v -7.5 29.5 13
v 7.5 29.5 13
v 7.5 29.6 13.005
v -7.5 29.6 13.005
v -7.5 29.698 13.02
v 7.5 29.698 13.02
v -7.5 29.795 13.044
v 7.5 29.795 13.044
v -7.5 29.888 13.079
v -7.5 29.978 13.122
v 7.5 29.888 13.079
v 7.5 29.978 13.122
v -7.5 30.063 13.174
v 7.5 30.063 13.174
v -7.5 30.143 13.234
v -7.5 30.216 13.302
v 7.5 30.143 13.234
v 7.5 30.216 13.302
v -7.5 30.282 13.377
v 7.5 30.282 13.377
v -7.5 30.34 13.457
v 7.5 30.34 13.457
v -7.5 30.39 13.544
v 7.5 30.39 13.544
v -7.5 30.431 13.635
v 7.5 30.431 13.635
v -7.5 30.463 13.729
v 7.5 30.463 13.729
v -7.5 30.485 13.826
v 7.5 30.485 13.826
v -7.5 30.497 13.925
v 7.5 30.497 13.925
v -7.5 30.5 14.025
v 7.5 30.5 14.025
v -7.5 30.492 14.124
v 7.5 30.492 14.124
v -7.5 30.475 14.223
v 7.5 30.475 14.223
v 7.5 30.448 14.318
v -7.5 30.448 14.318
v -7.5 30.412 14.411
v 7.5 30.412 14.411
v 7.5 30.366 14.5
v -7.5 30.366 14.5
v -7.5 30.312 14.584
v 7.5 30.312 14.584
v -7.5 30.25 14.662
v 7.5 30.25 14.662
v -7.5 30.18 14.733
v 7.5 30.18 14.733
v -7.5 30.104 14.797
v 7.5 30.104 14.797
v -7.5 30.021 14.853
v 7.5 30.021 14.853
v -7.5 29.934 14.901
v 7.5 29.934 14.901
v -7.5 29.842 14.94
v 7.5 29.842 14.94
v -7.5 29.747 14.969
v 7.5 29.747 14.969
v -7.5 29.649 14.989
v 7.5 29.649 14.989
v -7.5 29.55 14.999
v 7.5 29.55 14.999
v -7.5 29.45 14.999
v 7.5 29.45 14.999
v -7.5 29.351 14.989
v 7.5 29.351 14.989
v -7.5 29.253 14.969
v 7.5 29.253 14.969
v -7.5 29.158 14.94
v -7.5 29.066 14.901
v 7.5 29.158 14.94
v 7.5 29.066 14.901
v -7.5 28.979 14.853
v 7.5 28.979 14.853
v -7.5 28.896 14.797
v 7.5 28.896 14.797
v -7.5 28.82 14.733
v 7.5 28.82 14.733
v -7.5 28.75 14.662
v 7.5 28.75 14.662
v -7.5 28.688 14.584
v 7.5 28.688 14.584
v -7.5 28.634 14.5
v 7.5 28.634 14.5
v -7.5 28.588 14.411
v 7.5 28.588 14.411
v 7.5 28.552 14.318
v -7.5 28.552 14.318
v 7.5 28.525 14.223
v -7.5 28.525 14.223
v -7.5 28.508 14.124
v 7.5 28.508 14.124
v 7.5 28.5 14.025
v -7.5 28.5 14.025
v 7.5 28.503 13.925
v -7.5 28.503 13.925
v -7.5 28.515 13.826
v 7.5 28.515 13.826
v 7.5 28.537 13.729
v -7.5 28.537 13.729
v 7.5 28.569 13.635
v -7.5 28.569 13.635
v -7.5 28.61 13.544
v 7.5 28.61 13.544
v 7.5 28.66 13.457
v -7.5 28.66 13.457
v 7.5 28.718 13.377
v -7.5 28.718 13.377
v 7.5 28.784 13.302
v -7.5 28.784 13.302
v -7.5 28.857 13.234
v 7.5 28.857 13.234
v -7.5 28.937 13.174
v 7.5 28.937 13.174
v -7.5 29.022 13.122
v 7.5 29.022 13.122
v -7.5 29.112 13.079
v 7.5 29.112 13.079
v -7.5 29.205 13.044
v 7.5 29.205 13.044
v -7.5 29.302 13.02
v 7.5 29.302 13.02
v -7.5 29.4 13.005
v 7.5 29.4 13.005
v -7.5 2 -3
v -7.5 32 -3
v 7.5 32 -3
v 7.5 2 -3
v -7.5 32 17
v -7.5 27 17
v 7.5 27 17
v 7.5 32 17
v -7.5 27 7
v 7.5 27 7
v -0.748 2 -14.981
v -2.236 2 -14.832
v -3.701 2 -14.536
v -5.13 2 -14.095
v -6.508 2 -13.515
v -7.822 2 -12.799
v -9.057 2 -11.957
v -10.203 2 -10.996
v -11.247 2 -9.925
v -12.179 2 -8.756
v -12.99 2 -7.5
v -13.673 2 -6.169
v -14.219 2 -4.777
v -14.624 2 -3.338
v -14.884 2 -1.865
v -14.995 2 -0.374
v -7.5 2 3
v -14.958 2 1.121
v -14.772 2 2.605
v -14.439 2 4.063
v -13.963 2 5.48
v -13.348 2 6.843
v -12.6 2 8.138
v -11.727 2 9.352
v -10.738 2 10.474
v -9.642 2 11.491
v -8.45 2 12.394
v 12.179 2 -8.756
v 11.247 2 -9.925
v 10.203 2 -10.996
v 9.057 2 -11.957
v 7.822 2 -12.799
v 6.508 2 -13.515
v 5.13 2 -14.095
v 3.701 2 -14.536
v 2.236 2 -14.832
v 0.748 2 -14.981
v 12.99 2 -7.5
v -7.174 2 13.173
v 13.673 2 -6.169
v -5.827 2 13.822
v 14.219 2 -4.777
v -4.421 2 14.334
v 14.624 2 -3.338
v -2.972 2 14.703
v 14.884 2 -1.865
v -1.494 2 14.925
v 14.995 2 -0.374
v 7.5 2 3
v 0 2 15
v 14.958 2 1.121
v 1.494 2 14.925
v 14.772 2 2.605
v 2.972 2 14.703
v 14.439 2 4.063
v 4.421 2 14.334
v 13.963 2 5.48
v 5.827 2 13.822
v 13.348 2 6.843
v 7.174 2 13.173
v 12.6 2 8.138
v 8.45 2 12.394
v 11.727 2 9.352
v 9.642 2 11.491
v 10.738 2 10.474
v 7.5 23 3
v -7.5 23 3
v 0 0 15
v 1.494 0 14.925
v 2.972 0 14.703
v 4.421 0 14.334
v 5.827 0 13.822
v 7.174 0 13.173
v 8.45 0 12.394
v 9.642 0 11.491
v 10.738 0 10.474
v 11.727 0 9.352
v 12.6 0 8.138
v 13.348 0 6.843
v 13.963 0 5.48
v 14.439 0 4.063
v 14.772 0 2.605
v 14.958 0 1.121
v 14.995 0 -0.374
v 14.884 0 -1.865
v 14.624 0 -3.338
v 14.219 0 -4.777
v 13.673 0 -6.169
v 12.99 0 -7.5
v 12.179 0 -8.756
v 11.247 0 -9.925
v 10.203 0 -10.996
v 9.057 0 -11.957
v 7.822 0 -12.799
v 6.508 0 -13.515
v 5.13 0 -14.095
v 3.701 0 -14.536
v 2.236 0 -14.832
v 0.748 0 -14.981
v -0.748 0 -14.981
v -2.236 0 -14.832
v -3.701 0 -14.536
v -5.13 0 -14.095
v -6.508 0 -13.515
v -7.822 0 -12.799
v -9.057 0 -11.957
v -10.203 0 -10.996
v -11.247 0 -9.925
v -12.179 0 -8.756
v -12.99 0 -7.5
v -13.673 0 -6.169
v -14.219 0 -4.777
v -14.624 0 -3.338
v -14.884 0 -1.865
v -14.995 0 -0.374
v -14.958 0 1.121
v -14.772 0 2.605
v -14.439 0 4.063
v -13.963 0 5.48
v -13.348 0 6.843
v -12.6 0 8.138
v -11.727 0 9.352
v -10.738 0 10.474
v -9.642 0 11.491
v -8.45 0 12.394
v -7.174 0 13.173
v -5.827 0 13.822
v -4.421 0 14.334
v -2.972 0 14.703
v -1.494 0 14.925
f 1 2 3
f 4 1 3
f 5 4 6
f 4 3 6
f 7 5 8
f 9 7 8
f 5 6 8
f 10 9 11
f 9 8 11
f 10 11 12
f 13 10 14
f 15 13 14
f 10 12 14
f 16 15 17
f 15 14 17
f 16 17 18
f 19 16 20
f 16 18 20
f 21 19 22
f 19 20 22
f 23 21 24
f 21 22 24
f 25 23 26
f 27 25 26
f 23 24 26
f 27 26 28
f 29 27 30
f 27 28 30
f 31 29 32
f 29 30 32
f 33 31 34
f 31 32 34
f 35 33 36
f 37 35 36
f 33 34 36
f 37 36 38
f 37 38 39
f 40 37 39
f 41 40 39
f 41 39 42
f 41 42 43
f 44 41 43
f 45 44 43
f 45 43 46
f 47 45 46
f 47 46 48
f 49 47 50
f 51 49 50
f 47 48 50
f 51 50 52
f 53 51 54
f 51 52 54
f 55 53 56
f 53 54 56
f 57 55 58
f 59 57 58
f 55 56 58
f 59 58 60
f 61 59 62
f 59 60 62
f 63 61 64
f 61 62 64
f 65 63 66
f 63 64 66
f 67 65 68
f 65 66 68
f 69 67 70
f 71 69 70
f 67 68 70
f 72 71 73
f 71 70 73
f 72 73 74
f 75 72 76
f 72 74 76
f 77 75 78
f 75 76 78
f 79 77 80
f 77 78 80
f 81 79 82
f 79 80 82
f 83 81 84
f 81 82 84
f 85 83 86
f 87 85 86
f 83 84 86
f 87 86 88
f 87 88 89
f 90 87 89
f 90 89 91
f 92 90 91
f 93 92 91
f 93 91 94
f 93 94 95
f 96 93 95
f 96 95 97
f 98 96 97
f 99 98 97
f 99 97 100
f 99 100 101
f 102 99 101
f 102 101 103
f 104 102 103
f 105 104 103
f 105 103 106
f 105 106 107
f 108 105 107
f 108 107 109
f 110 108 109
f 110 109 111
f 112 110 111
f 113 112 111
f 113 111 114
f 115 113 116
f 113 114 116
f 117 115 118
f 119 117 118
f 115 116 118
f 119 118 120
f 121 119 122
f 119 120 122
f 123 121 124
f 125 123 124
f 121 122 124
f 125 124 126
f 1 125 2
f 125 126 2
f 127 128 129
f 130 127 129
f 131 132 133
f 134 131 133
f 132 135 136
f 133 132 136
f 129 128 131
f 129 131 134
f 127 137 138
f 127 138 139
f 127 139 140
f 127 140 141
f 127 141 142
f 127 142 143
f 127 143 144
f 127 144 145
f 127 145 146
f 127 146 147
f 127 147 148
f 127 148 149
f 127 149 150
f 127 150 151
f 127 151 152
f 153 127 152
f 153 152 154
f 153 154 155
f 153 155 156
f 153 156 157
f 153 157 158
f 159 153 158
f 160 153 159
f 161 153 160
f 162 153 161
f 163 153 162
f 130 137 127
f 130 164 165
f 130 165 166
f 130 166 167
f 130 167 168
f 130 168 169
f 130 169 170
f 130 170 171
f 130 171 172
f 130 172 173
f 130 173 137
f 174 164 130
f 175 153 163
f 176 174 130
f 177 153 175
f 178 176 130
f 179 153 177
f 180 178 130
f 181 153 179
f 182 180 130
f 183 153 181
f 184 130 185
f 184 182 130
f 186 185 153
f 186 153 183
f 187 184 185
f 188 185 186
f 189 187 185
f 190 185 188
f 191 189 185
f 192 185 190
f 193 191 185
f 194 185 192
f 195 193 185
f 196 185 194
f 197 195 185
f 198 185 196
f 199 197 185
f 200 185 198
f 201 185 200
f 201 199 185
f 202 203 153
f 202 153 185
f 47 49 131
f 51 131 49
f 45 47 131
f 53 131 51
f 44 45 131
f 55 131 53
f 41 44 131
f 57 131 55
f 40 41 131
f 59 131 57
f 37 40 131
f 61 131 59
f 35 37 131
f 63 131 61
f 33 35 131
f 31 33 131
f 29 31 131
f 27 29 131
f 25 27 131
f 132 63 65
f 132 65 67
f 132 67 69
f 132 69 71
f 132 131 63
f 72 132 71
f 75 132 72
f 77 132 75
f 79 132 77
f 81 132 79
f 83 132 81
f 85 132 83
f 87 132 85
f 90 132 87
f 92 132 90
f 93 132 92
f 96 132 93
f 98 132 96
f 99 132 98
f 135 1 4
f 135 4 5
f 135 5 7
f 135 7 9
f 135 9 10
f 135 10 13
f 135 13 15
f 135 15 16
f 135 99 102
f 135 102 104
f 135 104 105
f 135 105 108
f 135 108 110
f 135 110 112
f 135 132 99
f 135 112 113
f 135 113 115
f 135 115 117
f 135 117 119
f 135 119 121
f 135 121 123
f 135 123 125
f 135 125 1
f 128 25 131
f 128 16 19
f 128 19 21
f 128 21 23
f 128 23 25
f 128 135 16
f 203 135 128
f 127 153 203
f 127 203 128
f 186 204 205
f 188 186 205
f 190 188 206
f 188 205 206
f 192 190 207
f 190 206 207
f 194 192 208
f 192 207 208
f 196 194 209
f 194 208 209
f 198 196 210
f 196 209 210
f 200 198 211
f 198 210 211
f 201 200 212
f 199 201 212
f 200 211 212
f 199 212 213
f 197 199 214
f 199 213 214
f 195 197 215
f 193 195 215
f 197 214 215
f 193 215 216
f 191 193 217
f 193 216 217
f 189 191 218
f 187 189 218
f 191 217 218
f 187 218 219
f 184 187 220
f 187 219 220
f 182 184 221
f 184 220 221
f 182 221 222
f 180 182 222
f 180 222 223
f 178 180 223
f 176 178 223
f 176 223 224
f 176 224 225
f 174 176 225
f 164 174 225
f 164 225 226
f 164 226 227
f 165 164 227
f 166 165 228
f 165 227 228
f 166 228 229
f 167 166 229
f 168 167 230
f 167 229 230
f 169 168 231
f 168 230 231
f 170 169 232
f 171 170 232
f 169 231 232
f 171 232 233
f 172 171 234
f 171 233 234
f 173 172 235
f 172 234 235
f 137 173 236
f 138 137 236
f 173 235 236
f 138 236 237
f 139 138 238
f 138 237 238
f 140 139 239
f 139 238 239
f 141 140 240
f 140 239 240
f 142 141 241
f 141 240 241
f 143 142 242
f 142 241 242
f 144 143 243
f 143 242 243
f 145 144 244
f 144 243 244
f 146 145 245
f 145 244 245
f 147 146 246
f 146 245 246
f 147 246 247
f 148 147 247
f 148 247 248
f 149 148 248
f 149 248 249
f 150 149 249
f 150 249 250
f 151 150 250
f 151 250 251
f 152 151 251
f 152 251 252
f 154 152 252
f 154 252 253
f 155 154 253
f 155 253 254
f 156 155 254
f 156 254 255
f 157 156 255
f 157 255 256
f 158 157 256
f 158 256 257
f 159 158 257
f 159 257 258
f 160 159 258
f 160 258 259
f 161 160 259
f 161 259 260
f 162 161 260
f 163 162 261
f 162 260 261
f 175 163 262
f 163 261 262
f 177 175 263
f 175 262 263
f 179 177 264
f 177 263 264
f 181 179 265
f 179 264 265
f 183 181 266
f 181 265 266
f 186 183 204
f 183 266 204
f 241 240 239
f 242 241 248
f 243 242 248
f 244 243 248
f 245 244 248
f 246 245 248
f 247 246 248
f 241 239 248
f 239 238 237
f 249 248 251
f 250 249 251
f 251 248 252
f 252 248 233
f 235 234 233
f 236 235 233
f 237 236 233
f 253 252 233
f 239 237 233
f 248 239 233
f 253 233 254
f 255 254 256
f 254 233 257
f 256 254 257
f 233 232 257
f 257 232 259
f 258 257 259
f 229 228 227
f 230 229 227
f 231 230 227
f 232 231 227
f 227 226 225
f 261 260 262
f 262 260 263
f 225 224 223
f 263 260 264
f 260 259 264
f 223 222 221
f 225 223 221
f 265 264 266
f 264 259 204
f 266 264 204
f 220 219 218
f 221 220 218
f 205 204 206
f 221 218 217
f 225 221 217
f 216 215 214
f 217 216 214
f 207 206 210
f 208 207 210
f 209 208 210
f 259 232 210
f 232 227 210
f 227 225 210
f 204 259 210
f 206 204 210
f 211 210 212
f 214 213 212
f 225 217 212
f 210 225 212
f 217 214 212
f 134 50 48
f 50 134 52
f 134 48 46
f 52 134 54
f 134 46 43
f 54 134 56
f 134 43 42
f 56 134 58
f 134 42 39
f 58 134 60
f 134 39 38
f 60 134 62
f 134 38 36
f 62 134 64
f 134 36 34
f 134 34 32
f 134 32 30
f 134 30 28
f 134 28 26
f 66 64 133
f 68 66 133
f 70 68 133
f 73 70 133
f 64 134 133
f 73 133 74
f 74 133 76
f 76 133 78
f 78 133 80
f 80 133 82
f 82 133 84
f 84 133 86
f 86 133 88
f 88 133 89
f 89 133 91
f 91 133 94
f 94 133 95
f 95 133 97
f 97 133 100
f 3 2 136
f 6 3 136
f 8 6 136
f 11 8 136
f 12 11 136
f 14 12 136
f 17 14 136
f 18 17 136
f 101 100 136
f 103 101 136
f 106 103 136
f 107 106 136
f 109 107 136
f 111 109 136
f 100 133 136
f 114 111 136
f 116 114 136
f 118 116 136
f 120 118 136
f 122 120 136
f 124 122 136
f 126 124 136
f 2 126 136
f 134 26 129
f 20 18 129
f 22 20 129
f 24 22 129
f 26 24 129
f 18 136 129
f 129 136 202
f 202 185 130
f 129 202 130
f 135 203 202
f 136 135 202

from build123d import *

# Parameters (mm, degrees)
SKETCH1_R           = 15
BOSS_EXTRUDE1_DEPTH = 2
SKETCH2_W           = 15
SKETCH2_H           = 6
BOSS_EXTRUDE2_DEPTH = 25
SKETCH3_W           = 15
SKETCH3_H           = 20
BOSS_EXTRUDE3_DEPTH = 5
CHAMFER1_SIZE       = 4
SKETCH4_R           = 1
CUT_EXTRUDE1_DEPTH  = 15


with BuildPart() as part:
    # Sketch1 → Boss-Extrude1 (new body)
    with BuildSketch(Plane(origin=(0, 0, 0), x_dir=(1, 0, 0), z_dir=(0, 1, 0))):
        with Locations(Location((0, 0, 0), (0, 0, 270))):
            Circle(SKETCH1_R)
    extrude(amount=BOSS_EXTRUDE1_DEPTH)

    # Sketch2 → Boss-Extrude2 (add)
    with BuildSketch(Plane(origin=(0, 2, 0), x_dir=(1, 0, 0), z_dir=(0, 1, 0))):
        Rectangle(SKETCH2_W, SKETCH2_H)
    extrude(amount=BOSS_EXTRUDE2_DEPTH)

    # Sketch3 → Boss-Extrude3 (add)
    with BuildSketch(Plane(origin=(0, 27, 0), x_dir=(1, 0, 0), z_dir=(0, 1, 0))):
        with Locations((0, -7)):
            Rectangle(SKETCH3_W, SKETCH3_H)
    extrude(amount=BOSS_EXTRUDE3_DEPTH)

    # Chamfer1
    chamfer1_edges = [part.edges().sort_by_distance(p)[0] for p in [
        (0, 27, 3),
    ]]
    chamfer(chamfer1_edges, length=CHAMFER1_SIZE)

    # Sketch4 → Cut-Extrude1 (cut)
    with BuildSketch(Plane(origin=(7.5, 0, 0), x_dir=(0, 0, -1), z_dir=(1, 0, 0))):
        with Locations((-14, 29.5)):
            Circle(SKETCH4_R)
    extrude(amount=-CUT_EXTRUDE1_DEPTH, mode=Mode.SUBTRACT)


solid = part.part
